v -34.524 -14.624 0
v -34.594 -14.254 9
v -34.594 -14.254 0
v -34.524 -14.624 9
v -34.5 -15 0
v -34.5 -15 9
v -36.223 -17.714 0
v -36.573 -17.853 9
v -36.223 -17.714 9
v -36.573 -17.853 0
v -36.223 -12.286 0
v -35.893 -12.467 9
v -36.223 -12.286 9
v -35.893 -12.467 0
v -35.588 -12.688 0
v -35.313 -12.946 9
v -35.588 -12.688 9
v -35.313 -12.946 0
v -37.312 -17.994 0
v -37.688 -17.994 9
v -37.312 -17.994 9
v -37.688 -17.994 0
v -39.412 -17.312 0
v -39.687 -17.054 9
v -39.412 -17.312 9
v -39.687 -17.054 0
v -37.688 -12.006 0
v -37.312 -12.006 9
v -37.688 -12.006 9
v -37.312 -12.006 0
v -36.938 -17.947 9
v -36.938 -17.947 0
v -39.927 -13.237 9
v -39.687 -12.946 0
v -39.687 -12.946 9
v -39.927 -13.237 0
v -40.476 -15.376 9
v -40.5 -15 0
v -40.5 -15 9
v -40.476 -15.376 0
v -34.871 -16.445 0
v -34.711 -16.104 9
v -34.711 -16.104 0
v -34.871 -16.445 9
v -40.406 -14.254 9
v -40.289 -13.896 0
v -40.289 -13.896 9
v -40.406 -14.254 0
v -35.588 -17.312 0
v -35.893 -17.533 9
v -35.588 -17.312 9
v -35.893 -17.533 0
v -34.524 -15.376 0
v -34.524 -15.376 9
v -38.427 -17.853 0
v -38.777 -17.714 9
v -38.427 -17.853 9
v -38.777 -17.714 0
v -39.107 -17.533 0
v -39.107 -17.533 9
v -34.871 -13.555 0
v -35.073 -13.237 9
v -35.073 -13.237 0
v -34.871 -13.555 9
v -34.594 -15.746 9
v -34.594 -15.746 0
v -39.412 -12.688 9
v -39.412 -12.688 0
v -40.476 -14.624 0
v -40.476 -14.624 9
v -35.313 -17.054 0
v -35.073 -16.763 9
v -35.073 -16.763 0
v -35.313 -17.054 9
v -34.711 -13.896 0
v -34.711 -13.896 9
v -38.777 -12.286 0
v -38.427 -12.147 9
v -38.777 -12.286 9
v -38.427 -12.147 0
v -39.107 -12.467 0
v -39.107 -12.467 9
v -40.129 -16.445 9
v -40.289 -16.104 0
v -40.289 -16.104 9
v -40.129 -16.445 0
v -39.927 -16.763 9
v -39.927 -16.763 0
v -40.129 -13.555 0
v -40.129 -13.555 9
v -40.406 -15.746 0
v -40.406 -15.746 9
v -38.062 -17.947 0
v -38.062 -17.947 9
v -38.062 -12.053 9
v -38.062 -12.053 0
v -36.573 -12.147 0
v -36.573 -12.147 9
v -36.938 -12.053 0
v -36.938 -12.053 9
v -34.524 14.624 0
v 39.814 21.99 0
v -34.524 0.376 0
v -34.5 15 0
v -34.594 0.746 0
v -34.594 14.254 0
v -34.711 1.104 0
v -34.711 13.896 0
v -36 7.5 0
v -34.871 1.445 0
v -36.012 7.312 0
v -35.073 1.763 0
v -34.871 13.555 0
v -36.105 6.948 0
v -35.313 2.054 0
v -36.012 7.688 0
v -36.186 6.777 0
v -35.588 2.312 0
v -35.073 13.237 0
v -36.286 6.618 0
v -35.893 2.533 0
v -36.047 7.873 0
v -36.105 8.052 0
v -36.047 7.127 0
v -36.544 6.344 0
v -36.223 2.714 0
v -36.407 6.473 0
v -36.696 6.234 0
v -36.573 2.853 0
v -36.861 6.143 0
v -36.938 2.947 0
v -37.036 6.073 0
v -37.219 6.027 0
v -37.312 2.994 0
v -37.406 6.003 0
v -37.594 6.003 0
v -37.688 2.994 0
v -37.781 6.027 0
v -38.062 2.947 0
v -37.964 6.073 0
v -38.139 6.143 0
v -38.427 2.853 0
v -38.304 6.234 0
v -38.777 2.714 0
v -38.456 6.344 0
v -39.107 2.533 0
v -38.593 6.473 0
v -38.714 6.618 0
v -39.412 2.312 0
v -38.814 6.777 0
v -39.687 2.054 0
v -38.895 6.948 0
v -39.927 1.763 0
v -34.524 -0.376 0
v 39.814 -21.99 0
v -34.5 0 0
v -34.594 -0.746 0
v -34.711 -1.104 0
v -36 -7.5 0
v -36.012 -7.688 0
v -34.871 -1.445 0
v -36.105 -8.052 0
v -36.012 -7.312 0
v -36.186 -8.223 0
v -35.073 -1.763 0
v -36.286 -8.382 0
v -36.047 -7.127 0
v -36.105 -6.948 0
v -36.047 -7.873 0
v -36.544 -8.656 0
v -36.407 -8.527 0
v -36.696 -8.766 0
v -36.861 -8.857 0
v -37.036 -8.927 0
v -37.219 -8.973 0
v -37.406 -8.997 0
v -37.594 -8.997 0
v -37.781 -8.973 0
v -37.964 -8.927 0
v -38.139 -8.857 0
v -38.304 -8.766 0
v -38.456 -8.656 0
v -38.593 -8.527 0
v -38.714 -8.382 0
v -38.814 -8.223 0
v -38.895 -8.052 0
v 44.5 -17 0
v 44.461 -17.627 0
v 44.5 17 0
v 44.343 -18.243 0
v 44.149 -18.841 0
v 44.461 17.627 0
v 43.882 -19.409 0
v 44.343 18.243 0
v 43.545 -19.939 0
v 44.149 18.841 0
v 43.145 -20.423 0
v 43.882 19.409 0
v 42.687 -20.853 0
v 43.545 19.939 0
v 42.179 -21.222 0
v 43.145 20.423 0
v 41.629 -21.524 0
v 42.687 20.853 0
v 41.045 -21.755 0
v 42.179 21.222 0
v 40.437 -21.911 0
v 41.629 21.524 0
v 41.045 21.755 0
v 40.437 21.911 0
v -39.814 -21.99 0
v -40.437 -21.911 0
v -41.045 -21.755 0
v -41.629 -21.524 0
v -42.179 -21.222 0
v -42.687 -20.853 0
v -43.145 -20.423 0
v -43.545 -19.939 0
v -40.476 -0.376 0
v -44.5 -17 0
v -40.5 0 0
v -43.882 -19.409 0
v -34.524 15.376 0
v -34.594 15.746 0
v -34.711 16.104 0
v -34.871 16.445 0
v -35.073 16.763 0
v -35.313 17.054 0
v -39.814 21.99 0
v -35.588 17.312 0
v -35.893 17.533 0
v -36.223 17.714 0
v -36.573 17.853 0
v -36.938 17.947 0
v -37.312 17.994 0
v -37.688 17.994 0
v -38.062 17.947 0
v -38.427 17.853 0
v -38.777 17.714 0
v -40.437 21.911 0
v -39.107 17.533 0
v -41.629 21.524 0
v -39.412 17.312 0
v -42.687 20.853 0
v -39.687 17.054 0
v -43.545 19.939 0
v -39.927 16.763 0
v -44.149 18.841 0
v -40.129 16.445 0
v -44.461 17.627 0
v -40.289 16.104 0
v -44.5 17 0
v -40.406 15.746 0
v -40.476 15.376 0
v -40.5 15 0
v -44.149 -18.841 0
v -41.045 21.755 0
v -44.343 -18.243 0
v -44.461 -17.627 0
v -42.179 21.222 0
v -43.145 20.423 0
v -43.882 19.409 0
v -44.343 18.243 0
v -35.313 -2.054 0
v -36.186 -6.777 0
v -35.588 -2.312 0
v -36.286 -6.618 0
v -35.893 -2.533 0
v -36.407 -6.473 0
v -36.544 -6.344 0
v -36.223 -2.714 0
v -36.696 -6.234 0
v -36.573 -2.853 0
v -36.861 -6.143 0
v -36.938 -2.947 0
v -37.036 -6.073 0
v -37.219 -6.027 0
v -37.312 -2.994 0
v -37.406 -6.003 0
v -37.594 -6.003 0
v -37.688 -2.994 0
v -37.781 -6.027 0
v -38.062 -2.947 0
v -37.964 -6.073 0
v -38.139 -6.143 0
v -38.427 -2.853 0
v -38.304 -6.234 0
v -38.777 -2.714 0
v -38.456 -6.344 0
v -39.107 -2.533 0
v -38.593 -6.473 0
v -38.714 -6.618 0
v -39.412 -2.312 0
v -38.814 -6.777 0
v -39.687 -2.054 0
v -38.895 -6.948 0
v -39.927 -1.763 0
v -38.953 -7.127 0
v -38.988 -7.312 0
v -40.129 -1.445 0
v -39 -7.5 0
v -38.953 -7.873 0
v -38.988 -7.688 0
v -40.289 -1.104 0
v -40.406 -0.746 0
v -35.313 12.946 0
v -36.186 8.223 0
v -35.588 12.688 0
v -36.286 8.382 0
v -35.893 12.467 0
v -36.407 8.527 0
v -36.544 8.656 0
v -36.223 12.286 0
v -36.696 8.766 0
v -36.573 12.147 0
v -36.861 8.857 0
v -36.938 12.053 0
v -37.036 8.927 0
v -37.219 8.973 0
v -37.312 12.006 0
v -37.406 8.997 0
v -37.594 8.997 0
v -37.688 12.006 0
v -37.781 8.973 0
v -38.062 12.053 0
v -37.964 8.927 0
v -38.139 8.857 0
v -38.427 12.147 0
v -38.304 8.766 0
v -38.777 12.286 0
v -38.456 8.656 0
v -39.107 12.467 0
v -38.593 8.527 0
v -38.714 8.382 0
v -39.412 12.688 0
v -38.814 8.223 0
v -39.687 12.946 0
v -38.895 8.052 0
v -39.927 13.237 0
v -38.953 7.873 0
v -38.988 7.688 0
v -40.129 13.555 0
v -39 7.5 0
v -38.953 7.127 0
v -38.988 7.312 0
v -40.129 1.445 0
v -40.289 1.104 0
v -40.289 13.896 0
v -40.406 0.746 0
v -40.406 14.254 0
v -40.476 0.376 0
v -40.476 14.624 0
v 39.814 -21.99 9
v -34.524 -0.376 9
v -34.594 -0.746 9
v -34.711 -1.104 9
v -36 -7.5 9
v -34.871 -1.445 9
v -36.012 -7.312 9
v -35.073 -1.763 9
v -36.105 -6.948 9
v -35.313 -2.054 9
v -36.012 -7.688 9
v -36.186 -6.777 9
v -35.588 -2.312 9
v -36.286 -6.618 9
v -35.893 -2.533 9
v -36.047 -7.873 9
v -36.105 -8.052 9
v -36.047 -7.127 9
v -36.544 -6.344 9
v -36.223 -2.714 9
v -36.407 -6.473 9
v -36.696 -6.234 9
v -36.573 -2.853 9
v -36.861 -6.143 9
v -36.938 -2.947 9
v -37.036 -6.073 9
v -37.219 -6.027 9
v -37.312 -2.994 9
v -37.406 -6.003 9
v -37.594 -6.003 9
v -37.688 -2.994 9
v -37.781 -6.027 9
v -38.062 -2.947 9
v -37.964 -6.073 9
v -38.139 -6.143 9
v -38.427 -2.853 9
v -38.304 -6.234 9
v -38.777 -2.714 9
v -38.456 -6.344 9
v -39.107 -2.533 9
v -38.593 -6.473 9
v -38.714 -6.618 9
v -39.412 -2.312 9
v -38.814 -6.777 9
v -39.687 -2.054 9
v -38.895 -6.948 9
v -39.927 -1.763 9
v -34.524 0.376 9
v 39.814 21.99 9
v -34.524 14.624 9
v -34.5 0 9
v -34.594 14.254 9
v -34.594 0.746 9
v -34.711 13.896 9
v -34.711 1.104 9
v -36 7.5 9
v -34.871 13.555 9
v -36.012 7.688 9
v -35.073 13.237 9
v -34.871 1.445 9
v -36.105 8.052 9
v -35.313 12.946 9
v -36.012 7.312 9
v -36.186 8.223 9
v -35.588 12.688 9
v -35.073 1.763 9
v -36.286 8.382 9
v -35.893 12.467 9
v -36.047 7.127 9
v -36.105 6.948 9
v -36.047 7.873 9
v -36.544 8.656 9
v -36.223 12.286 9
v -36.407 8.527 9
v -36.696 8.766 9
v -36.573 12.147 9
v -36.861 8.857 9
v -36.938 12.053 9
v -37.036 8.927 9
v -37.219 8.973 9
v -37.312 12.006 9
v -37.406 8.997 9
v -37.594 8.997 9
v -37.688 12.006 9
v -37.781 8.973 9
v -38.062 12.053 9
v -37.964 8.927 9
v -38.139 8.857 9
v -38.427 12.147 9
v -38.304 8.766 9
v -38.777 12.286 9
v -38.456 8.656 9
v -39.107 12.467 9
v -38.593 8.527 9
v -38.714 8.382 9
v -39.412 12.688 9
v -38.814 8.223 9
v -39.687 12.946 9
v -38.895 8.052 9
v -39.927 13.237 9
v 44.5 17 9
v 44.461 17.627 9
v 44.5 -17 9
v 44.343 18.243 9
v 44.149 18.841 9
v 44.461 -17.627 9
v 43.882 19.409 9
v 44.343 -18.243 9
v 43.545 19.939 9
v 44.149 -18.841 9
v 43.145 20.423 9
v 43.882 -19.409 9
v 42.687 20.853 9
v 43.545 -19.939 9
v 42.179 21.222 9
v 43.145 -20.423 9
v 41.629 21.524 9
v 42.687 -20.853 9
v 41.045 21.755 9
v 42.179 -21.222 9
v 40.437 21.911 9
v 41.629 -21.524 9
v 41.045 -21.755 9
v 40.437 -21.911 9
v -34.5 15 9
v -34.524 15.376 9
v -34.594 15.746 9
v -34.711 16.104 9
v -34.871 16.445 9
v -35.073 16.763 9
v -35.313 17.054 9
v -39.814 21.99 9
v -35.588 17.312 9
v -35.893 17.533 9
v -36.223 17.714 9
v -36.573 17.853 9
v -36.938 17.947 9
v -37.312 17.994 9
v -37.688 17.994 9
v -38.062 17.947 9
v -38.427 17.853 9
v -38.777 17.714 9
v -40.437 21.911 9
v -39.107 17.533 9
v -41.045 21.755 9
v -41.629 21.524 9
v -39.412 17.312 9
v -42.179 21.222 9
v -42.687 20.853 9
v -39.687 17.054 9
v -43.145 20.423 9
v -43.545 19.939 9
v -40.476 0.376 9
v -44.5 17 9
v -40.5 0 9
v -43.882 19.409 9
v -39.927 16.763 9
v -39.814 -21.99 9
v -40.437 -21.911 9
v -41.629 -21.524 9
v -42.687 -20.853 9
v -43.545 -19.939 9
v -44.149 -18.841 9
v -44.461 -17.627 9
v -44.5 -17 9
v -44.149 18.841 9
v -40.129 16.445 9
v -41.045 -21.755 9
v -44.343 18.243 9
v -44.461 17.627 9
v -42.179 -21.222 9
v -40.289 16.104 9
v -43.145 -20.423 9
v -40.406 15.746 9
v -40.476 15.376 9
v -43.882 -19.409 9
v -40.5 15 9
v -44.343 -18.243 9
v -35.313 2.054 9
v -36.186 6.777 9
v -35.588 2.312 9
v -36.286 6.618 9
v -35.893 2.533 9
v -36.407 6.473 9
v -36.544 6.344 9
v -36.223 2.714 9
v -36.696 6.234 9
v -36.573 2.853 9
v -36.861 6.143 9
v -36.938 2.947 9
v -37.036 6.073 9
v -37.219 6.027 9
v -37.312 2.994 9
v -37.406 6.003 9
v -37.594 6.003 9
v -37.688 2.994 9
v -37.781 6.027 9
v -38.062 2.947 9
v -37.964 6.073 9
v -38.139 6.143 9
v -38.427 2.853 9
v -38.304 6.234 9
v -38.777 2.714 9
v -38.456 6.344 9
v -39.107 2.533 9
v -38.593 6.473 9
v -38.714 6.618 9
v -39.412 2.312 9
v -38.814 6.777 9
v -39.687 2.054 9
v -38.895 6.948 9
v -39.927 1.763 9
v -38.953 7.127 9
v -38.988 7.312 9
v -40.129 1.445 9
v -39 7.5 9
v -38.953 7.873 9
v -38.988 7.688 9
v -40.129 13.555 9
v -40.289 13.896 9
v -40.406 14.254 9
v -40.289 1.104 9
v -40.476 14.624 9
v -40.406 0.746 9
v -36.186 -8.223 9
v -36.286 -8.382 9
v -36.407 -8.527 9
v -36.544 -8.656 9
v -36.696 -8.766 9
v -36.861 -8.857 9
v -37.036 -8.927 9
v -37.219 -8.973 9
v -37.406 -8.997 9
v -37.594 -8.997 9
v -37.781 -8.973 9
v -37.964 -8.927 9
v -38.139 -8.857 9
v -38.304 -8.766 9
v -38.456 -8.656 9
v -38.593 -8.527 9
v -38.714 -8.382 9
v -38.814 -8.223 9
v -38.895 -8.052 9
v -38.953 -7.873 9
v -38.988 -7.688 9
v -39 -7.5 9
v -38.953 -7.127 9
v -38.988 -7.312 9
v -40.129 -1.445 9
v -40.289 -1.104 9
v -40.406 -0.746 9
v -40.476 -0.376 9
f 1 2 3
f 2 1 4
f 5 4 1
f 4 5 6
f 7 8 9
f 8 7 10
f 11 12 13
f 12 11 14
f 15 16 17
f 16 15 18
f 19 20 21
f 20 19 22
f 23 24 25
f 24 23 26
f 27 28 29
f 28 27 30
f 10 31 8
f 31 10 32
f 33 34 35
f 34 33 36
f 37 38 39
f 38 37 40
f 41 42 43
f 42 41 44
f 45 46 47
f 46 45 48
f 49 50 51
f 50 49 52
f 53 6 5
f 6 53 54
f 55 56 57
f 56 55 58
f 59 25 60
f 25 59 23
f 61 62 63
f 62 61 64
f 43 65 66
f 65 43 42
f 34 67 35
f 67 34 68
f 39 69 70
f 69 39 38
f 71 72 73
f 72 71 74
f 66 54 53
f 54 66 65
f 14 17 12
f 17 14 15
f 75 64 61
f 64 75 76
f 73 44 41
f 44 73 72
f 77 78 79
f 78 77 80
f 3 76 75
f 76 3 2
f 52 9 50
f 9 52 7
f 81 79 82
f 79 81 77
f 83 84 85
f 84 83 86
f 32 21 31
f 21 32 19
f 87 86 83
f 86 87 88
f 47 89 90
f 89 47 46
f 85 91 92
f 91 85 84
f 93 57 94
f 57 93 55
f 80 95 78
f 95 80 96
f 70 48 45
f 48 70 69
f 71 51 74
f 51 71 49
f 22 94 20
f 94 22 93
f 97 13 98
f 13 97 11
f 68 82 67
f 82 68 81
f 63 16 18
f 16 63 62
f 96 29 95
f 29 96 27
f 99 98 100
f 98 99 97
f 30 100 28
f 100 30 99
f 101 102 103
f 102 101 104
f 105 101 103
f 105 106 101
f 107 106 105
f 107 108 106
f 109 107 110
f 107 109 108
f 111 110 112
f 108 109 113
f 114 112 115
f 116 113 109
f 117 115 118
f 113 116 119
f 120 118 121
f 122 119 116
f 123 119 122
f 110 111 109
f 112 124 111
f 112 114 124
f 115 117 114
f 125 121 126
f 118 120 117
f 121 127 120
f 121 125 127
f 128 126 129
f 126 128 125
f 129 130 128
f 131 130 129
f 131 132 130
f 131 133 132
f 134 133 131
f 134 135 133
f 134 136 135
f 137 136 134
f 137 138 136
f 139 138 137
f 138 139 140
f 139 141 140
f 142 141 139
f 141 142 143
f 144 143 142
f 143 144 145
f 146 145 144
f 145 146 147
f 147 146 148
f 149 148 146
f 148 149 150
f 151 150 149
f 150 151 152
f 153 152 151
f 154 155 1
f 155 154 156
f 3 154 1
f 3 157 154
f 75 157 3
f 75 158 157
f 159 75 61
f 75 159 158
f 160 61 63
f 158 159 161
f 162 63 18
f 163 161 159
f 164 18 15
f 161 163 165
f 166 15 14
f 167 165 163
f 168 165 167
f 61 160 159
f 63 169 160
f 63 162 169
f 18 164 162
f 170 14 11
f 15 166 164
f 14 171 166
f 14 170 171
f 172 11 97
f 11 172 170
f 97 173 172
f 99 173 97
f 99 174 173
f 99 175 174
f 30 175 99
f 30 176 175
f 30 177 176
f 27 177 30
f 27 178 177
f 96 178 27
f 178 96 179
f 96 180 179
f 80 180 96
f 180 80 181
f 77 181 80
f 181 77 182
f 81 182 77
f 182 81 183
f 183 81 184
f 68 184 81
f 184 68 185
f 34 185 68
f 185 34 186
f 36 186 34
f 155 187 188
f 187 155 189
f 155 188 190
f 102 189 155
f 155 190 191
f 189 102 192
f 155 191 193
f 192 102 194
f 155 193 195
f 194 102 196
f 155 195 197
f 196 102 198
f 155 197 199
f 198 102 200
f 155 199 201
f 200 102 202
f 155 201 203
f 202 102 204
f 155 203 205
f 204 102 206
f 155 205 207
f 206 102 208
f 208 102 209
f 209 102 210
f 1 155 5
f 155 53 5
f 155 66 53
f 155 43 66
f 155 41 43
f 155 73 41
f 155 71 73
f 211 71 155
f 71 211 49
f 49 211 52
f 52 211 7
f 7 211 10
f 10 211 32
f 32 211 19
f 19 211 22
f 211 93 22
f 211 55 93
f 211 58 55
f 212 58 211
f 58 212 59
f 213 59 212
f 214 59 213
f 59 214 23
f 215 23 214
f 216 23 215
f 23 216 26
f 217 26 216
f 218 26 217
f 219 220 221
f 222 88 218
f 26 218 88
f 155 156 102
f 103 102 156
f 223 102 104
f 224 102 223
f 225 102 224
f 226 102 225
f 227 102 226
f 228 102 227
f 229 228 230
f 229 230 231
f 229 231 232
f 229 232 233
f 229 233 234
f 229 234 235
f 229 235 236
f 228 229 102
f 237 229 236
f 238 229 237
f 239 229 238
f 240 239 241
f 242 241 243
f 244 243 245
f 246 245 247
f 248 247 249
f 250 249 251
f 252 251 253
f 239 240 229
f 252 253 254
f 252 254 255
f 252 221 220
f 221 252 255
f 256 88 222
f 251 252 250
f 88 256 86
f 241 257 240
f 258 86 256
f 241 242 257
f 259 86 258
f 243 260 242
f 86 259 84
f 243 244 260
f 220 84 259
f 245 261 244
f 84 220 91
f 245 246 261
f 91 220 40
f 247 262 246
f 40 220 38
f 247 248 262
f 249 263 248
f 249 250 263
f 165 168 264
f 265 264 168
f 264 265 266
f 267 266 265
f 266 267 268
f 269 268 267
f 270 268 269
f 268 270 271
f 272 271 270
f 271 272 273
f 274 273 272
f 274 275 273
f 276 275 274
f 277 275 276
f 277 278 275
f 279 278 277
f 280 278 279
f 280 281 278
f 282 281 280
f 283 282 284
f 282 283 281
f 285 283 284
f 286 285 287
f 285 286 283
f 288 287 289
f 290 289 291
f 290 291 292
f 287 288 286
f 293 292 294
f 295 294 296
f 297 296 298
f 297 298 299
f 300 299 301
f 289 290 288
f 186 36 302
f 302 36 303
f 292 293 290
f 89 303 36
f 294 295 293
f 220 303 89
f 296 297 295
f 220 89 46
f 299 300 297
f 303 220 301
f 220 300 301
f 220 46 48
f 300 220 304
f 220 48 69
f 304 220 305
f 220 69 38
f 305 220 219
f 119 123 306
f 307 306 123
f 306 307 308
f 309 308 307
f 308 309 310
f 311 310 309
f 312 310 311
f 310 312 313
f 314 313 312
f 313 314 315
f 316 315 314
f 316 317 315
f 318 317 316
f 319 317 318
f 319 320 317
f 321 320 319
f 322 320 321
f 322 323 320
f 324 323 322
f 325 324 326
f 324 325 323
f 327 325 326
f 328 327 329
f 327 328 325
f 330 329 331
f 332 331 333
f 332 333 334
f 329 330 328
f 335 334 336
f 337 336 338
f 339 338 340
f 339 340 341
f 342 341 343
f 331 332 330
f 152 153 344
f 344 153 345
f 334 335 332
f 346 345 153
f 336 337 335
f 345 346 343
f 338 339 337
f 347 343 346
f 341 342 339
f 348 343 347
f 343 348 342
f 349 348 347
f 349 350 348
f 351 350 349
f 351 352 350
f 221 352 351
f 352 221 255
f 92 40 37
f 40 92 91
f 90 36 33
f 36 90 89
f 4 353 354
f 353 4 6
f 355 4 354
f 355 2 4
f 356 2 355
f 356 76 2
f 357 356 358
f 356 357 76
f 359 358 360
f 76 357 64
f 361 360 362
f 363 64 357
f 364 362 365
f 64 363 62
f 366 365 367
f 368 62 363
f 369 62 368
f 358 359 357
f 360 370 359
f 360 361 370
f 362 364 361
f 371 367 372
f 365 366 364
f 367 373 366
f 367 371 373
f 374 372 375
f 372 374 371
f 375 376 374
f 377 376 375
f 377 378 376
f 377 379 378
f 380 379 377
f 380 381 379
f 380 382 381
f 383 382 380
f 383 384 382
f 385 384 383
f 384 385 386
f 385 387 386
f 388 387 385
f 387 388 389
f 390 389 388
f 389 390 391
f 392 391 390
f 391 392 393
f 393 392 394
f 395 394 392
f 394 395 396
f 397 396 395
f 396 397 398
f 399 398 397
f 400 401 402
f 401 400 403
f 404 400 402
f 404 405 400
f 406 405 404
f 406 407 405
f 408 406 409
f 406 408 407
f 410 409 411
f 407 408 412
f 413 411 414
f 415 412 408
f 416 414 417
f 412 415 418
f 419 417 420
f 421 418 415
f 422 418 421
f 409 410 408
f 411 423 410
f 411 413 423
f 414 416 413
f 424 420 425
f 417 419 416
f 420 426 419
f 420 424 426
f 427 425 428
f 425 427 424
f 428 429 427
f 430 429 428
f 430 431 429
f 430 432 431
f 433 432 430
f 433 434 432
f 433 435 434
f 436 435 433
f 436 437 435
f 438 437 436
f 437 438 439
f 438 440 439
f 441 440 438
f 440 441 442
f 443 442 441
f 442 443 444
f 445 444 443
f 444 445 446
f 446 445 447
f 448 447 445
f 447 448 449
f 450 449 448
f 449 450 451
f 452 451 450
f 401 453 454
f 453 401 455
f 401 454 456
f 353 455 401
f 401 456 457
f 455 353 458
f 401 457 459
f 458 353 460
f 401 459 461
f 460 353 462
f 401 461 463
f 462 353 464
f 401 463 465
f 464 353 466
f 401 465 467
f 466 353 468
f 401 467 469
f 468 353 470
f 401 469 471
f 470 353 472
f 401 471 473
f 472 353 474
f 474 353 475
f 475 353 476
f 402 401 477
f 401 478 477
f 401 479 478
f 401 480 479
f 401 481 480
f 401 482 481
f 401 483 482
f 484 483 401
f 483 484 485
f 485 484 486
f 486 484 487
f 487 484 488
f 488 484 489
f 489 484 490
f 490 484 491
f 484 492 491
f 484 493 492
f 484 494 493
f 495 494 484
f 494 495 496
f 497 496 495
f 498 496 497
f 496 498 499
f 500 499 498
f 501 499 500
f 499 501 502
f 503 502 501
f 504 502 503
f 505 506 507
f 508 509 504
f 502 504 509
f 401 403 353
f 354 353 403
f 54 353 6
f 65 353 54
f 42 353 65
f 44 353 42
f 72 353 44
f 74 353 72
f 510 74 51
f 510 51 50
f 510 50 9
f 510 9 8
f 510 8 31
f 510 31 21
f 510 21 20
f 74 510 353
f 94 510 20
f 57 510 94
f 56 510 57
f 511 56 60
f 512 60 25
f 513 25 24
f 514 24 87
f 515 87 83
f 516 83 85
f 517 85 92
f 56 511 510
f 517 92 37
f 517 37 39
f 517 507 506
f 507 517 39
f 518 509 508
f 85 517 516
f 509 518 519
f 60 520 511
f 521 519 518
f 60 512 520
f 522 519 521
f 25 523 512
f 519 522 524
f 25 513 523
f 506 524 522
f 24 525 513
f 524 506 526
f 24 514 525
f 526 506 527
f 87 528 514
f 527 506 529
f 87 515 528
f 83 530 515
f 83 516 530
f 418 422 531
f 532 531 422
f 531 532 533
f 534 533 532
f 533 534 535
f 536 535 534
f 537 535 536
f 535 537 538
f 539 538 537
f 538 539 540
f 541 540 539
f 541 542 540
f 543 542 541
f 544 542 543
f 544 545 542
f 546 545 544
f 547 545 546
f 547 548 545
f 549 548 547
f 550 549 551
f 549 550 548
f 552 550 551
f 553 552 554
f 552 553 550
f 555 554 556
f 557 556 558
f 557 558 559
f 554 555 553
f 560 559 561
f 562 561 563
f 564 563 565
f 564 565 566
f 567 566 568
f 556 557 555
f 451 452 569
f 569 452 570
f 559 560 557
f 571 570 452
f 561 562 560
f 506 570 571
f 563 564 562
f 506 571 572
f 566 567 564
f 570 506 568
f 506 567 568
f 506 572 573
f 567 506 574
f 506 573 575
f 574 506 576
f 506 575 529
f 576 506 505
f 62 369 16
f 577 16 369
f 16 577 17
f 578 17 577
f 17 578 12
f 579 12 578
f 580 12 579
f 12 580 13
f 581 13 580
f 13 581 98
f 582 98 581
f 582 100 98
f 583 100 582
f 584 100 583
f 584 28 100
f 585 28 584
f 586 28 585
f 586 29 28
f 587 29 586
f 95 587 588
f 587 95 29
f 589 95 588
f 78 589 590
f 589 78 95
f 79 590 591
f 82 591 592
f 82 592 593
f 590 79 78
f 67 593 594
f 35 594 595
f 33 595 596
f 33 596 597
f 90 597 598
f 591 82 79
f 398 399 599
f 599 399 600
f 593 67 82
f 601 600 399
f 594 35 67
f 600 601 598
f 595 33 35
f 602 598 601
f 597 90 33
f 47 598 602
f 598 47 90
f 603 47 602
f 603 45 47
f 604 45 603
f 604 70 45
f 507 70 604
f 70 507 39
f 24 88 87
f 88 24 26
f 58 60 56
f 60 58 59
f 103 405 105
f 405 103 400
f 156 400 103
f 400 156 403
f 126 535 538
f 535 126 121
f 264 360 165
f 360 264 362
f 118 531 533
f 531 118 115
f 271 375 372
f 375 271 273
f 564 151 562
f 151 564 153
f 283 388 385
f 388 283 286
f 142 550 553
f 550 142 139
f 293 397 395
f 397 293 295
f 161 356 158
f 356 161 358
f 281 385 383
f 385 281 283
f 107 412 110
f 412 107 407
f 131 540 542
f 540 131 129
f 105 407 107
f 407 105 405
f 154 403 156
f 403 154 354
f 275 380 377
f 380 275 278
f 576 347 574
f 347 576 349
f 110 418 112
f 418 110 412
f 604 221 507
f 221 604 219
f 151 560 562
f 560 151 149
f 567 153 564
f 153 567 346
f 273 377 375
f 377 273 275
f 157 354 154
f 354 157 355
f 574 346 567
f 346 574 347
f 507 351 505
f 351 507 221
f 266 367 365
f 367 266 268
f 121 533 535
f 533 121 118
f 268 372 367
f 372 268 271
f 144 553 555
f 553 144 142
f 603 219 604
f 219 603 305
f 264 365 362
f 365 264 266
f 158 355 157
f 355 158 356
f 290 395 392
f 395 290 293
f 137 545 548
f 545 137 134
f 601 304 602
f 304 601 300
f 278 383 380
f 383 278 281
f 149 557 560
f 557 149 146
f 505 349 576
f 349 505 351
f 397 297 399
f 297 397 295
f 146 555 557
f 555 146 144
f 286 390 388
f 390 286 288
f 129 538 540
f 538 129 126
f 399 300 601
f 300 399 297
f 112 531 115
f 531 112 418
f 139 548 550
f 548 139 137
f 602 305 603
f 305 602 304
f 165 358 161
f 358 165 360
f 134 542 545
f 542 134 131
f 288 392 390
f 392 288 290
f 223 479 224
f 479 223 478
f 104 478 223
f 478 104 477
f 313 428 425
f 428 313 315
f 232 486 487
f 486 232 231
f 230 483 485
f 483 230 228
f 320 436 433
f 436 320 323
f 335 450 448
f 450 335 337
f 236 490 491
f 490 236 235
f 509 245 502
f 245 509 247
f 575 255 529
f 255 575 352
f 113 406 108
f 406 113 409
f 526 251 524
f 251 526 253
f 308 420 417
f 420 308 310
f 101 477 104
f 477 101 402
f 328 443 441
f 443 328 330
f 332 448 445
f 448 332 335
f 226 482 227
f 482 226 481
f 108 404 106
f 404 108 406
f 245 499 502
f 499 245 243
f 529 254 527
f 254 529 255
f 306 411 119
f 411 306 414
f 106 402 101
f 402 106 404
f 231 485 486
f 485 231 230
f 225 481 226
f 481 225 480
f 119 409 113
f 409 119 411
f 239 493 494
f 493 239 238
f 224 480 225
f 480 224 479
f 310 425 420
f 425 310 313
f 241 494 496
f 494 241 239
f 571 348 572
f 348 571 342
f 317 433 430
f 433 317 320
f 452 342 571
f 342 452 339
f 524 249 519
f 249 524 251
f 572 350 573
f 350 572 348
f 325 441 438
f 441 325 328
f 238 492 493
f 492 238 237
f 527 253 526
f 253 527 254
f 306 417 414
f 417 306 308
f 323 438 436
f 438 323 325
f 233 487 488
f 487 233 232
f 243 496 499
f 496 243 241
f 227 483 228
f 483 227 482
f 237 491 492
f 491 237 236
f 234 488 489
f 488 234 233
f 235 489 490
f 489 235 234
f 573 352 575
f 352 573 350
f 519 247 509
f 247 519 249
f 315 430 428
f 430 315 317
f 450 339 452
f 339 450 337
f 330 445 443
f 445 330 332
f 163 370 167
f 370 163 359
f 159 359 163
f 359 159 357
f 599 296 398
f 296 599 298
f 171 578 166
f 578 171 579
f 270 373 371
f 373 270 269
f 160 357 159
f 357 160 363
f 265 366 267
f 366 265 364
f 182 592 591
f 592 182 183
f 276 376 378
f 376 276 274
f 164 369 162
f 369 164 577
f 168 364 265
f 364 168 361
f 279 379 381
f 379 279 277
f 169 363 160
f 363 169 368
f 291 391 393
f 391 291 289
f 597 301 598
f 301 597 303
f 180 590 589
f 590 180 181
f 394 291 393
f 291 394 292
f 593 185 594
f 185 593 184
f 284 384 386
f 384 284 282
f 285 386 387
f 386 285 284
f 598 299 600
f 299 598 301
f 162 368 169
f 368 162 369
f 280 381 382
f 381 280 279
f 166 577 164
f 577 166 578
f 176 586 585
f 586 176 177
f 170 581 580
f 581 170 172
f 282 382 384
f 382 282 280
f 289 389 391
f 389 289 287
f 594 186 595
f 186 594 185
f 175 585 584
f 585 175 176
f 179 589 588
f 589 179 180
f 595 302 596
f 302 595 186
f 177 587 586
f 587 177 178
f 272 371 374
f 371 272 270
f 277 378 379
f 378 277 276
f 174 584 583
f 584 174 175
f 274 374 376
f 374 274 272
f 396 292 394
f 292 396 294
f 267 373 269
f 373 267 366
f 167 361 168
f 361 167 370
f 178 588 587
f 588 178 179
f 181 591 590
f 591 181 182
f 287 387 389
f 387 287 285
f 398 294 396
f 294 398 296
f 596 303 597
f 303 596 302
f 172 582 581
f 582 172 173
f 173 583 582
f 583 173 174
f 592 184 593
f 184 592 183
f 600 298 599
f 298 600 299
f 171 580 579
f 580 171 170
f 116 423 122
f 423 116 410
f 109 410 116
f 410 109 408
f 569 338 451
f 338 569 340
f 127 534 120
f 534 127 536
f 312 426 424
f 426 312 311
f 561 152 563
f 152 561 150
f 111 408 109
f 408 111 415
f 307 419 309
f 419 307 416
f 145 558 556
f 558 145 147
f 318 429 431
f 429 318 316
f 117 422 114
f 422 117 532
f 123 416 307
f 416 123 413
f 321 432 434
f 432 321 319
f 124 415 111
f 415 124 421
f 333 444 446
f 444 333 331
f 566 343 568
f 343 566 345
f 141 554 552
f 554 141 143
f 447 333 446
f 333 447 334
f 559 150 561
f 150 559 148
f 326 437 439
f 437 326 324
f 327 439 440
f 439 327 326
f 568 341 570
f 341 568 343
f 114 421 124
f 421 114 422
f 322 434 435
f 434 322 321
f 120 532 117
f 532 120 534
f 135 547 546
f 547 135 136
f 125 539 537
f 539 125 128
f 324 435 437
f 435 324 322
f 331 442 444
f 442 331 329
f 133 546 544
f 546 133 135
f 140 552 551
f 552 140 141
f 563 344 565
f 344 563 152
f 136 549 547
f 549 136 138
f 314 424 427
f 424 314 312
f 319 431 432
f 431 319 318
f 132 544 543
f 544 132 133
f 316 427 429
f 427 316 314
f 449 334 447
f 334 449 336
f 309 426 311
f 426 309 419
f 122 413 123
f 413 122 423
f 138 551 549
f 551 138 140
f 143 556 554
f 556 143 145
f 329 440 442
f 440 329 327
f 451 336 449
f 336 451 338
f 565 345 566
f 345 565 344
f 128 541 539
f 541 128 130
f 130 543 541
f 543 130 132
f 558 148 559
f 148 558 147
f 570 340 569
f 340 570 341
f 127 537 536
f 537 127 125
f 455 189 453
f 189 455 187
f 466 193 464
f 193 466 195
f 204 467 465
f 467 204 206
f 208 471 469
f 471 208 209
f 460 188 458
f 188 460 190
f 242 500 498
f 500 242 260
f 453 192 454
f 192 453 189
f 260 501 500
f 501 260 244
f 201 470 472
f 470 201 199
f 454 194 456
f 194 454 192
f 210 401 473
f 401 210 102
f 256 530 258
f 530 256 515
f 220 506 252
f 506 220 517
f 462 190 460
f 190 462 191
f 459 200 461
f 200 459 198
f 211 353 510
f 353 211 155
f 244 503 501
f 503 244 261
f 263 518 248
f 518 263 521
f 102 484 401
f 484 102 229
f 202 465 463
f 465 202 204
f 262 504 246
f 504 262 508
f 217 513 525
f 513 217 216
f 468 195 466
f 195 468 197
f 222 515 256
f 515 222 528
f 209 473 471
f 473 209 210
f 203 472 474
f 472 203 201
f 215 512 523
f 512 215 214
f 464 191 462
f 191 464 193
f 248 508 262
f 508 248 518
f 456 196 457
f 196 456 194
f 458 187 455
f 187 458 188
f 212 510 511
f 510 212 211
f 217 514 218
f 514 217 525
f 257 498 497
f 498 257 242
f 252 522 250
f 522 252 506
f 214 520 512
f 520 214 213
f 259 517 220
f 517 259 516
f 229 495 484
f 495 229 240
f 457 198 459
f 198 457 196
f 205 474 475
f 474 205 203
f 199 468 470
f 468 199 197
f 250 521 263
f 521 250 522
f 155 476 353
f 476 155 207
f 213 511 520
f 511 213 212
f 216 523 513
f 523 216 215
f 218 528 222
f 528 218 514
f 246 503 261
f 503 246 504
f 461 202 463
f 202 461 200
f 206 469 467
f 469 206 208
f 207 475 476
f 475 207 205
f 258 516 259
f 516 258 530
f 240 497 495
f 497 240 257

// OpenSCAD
$fn = 50;


difference() {
	union() {
		hull() {
			translate(v = [-39.5000000000, 17.0000000000, 0]) {
				cylinder(h = 9, r = 5);
			}
			translate(v = [39.5000000000, 17.0000000000, 0]) {
				cylinder(h = 9, r = 5);
			}
			translate(v = [-39.5000000000, -17.0000000000, 0]) {
				cylinder(h = 9, r = 5);
			}
			translate(v = [39.5000000000, -17.0000000000, 0]) {
				cylinder(h = 9, r = 5);
			}
		}
	}
	union() {
		translate(v = [-37.5000000000, -15.0000000000, 0]) {
			cylinder(h = 9, r = 3.0000000000);
		}
		translate(v = [-37.5000000000, 0.0000000000, 0]) {
			cylinder(h = 9, r = 3.0000000000);
		}
		translate(v = [-37.5000000000, 15.0000000000, 0]) {
			cylinder(h = 9, r = 3.0000000000);
		}
		translate(v = [-37.5000000000, -15.0000000000, 0]) {
			cylinder(h = 9, r = 1.5000000000);
		}
		translate(v = [-37.5000000000, -7.5000000000, 0]) {
			cylinder(h = 9, r = 1.5000000000);
		}
		translate(v = [-37.5000000000, 0.0000000000, 0]) {
			cylinder(h = 9, r = 1.5000000000);
		}
		translate(v = [-37.5000000000, 7.5000000000, 0]) {
			cylinder(h = 9, r = 1.5000000000);
		}
		translate(v = [-37.5000000000, 15.0000000000, 0]) {
			cylinder(h = 9, r = 1.5000000000);
		}
		translate(v = [-37.5000000000, -15.0000000000, 0]) {
			cylinder(h = 9, r = 1.5000000000);
		}
		translate(v = [-37.5000000000, -7.5000000000, 0]) {
			cylinder(h = 9, r = 1.5000000000);
		}
		translate(v = [-37.5000000000, 0.0000000000, 0]) {
			cylinder(h = 9, r = 1.5000000000);
		}
		translate(v = [-37.5000000000, 7.5000000000, 0]) {
			cylinder(h = 9, r = 1.5000000000);
		}
		translate(v = [-37.5000000000, 15.0000000000, 0]) {
			cylinder(h = 9, r = 1.5000000000);
		}
		translate(v = [-37.5000000000, -15.0000000000, 0]) {
			cylinder(h = 9, r = 1.5000000000);
		}
		translate(v = [-37.5000000000, -7.5000000000, 0]) {
			cylinder(h = 9, r = 1.5000000000);
		}
		translate(v = [-37.5000000000, 0.0000000000, 0]) {
			cylinder(h = 9, r = 1.5000000000);
		}
		translate(v = [-37.5000000000, 7.5000000000, 0]) {
			cylinder(h = 9, r = 1.5000000000);
		}
		translate(v = [-37.5000000000, 15.0000000000, 0]) {
			cylinder(h = 9, r = 1.5000000000);
		}
	}
}
